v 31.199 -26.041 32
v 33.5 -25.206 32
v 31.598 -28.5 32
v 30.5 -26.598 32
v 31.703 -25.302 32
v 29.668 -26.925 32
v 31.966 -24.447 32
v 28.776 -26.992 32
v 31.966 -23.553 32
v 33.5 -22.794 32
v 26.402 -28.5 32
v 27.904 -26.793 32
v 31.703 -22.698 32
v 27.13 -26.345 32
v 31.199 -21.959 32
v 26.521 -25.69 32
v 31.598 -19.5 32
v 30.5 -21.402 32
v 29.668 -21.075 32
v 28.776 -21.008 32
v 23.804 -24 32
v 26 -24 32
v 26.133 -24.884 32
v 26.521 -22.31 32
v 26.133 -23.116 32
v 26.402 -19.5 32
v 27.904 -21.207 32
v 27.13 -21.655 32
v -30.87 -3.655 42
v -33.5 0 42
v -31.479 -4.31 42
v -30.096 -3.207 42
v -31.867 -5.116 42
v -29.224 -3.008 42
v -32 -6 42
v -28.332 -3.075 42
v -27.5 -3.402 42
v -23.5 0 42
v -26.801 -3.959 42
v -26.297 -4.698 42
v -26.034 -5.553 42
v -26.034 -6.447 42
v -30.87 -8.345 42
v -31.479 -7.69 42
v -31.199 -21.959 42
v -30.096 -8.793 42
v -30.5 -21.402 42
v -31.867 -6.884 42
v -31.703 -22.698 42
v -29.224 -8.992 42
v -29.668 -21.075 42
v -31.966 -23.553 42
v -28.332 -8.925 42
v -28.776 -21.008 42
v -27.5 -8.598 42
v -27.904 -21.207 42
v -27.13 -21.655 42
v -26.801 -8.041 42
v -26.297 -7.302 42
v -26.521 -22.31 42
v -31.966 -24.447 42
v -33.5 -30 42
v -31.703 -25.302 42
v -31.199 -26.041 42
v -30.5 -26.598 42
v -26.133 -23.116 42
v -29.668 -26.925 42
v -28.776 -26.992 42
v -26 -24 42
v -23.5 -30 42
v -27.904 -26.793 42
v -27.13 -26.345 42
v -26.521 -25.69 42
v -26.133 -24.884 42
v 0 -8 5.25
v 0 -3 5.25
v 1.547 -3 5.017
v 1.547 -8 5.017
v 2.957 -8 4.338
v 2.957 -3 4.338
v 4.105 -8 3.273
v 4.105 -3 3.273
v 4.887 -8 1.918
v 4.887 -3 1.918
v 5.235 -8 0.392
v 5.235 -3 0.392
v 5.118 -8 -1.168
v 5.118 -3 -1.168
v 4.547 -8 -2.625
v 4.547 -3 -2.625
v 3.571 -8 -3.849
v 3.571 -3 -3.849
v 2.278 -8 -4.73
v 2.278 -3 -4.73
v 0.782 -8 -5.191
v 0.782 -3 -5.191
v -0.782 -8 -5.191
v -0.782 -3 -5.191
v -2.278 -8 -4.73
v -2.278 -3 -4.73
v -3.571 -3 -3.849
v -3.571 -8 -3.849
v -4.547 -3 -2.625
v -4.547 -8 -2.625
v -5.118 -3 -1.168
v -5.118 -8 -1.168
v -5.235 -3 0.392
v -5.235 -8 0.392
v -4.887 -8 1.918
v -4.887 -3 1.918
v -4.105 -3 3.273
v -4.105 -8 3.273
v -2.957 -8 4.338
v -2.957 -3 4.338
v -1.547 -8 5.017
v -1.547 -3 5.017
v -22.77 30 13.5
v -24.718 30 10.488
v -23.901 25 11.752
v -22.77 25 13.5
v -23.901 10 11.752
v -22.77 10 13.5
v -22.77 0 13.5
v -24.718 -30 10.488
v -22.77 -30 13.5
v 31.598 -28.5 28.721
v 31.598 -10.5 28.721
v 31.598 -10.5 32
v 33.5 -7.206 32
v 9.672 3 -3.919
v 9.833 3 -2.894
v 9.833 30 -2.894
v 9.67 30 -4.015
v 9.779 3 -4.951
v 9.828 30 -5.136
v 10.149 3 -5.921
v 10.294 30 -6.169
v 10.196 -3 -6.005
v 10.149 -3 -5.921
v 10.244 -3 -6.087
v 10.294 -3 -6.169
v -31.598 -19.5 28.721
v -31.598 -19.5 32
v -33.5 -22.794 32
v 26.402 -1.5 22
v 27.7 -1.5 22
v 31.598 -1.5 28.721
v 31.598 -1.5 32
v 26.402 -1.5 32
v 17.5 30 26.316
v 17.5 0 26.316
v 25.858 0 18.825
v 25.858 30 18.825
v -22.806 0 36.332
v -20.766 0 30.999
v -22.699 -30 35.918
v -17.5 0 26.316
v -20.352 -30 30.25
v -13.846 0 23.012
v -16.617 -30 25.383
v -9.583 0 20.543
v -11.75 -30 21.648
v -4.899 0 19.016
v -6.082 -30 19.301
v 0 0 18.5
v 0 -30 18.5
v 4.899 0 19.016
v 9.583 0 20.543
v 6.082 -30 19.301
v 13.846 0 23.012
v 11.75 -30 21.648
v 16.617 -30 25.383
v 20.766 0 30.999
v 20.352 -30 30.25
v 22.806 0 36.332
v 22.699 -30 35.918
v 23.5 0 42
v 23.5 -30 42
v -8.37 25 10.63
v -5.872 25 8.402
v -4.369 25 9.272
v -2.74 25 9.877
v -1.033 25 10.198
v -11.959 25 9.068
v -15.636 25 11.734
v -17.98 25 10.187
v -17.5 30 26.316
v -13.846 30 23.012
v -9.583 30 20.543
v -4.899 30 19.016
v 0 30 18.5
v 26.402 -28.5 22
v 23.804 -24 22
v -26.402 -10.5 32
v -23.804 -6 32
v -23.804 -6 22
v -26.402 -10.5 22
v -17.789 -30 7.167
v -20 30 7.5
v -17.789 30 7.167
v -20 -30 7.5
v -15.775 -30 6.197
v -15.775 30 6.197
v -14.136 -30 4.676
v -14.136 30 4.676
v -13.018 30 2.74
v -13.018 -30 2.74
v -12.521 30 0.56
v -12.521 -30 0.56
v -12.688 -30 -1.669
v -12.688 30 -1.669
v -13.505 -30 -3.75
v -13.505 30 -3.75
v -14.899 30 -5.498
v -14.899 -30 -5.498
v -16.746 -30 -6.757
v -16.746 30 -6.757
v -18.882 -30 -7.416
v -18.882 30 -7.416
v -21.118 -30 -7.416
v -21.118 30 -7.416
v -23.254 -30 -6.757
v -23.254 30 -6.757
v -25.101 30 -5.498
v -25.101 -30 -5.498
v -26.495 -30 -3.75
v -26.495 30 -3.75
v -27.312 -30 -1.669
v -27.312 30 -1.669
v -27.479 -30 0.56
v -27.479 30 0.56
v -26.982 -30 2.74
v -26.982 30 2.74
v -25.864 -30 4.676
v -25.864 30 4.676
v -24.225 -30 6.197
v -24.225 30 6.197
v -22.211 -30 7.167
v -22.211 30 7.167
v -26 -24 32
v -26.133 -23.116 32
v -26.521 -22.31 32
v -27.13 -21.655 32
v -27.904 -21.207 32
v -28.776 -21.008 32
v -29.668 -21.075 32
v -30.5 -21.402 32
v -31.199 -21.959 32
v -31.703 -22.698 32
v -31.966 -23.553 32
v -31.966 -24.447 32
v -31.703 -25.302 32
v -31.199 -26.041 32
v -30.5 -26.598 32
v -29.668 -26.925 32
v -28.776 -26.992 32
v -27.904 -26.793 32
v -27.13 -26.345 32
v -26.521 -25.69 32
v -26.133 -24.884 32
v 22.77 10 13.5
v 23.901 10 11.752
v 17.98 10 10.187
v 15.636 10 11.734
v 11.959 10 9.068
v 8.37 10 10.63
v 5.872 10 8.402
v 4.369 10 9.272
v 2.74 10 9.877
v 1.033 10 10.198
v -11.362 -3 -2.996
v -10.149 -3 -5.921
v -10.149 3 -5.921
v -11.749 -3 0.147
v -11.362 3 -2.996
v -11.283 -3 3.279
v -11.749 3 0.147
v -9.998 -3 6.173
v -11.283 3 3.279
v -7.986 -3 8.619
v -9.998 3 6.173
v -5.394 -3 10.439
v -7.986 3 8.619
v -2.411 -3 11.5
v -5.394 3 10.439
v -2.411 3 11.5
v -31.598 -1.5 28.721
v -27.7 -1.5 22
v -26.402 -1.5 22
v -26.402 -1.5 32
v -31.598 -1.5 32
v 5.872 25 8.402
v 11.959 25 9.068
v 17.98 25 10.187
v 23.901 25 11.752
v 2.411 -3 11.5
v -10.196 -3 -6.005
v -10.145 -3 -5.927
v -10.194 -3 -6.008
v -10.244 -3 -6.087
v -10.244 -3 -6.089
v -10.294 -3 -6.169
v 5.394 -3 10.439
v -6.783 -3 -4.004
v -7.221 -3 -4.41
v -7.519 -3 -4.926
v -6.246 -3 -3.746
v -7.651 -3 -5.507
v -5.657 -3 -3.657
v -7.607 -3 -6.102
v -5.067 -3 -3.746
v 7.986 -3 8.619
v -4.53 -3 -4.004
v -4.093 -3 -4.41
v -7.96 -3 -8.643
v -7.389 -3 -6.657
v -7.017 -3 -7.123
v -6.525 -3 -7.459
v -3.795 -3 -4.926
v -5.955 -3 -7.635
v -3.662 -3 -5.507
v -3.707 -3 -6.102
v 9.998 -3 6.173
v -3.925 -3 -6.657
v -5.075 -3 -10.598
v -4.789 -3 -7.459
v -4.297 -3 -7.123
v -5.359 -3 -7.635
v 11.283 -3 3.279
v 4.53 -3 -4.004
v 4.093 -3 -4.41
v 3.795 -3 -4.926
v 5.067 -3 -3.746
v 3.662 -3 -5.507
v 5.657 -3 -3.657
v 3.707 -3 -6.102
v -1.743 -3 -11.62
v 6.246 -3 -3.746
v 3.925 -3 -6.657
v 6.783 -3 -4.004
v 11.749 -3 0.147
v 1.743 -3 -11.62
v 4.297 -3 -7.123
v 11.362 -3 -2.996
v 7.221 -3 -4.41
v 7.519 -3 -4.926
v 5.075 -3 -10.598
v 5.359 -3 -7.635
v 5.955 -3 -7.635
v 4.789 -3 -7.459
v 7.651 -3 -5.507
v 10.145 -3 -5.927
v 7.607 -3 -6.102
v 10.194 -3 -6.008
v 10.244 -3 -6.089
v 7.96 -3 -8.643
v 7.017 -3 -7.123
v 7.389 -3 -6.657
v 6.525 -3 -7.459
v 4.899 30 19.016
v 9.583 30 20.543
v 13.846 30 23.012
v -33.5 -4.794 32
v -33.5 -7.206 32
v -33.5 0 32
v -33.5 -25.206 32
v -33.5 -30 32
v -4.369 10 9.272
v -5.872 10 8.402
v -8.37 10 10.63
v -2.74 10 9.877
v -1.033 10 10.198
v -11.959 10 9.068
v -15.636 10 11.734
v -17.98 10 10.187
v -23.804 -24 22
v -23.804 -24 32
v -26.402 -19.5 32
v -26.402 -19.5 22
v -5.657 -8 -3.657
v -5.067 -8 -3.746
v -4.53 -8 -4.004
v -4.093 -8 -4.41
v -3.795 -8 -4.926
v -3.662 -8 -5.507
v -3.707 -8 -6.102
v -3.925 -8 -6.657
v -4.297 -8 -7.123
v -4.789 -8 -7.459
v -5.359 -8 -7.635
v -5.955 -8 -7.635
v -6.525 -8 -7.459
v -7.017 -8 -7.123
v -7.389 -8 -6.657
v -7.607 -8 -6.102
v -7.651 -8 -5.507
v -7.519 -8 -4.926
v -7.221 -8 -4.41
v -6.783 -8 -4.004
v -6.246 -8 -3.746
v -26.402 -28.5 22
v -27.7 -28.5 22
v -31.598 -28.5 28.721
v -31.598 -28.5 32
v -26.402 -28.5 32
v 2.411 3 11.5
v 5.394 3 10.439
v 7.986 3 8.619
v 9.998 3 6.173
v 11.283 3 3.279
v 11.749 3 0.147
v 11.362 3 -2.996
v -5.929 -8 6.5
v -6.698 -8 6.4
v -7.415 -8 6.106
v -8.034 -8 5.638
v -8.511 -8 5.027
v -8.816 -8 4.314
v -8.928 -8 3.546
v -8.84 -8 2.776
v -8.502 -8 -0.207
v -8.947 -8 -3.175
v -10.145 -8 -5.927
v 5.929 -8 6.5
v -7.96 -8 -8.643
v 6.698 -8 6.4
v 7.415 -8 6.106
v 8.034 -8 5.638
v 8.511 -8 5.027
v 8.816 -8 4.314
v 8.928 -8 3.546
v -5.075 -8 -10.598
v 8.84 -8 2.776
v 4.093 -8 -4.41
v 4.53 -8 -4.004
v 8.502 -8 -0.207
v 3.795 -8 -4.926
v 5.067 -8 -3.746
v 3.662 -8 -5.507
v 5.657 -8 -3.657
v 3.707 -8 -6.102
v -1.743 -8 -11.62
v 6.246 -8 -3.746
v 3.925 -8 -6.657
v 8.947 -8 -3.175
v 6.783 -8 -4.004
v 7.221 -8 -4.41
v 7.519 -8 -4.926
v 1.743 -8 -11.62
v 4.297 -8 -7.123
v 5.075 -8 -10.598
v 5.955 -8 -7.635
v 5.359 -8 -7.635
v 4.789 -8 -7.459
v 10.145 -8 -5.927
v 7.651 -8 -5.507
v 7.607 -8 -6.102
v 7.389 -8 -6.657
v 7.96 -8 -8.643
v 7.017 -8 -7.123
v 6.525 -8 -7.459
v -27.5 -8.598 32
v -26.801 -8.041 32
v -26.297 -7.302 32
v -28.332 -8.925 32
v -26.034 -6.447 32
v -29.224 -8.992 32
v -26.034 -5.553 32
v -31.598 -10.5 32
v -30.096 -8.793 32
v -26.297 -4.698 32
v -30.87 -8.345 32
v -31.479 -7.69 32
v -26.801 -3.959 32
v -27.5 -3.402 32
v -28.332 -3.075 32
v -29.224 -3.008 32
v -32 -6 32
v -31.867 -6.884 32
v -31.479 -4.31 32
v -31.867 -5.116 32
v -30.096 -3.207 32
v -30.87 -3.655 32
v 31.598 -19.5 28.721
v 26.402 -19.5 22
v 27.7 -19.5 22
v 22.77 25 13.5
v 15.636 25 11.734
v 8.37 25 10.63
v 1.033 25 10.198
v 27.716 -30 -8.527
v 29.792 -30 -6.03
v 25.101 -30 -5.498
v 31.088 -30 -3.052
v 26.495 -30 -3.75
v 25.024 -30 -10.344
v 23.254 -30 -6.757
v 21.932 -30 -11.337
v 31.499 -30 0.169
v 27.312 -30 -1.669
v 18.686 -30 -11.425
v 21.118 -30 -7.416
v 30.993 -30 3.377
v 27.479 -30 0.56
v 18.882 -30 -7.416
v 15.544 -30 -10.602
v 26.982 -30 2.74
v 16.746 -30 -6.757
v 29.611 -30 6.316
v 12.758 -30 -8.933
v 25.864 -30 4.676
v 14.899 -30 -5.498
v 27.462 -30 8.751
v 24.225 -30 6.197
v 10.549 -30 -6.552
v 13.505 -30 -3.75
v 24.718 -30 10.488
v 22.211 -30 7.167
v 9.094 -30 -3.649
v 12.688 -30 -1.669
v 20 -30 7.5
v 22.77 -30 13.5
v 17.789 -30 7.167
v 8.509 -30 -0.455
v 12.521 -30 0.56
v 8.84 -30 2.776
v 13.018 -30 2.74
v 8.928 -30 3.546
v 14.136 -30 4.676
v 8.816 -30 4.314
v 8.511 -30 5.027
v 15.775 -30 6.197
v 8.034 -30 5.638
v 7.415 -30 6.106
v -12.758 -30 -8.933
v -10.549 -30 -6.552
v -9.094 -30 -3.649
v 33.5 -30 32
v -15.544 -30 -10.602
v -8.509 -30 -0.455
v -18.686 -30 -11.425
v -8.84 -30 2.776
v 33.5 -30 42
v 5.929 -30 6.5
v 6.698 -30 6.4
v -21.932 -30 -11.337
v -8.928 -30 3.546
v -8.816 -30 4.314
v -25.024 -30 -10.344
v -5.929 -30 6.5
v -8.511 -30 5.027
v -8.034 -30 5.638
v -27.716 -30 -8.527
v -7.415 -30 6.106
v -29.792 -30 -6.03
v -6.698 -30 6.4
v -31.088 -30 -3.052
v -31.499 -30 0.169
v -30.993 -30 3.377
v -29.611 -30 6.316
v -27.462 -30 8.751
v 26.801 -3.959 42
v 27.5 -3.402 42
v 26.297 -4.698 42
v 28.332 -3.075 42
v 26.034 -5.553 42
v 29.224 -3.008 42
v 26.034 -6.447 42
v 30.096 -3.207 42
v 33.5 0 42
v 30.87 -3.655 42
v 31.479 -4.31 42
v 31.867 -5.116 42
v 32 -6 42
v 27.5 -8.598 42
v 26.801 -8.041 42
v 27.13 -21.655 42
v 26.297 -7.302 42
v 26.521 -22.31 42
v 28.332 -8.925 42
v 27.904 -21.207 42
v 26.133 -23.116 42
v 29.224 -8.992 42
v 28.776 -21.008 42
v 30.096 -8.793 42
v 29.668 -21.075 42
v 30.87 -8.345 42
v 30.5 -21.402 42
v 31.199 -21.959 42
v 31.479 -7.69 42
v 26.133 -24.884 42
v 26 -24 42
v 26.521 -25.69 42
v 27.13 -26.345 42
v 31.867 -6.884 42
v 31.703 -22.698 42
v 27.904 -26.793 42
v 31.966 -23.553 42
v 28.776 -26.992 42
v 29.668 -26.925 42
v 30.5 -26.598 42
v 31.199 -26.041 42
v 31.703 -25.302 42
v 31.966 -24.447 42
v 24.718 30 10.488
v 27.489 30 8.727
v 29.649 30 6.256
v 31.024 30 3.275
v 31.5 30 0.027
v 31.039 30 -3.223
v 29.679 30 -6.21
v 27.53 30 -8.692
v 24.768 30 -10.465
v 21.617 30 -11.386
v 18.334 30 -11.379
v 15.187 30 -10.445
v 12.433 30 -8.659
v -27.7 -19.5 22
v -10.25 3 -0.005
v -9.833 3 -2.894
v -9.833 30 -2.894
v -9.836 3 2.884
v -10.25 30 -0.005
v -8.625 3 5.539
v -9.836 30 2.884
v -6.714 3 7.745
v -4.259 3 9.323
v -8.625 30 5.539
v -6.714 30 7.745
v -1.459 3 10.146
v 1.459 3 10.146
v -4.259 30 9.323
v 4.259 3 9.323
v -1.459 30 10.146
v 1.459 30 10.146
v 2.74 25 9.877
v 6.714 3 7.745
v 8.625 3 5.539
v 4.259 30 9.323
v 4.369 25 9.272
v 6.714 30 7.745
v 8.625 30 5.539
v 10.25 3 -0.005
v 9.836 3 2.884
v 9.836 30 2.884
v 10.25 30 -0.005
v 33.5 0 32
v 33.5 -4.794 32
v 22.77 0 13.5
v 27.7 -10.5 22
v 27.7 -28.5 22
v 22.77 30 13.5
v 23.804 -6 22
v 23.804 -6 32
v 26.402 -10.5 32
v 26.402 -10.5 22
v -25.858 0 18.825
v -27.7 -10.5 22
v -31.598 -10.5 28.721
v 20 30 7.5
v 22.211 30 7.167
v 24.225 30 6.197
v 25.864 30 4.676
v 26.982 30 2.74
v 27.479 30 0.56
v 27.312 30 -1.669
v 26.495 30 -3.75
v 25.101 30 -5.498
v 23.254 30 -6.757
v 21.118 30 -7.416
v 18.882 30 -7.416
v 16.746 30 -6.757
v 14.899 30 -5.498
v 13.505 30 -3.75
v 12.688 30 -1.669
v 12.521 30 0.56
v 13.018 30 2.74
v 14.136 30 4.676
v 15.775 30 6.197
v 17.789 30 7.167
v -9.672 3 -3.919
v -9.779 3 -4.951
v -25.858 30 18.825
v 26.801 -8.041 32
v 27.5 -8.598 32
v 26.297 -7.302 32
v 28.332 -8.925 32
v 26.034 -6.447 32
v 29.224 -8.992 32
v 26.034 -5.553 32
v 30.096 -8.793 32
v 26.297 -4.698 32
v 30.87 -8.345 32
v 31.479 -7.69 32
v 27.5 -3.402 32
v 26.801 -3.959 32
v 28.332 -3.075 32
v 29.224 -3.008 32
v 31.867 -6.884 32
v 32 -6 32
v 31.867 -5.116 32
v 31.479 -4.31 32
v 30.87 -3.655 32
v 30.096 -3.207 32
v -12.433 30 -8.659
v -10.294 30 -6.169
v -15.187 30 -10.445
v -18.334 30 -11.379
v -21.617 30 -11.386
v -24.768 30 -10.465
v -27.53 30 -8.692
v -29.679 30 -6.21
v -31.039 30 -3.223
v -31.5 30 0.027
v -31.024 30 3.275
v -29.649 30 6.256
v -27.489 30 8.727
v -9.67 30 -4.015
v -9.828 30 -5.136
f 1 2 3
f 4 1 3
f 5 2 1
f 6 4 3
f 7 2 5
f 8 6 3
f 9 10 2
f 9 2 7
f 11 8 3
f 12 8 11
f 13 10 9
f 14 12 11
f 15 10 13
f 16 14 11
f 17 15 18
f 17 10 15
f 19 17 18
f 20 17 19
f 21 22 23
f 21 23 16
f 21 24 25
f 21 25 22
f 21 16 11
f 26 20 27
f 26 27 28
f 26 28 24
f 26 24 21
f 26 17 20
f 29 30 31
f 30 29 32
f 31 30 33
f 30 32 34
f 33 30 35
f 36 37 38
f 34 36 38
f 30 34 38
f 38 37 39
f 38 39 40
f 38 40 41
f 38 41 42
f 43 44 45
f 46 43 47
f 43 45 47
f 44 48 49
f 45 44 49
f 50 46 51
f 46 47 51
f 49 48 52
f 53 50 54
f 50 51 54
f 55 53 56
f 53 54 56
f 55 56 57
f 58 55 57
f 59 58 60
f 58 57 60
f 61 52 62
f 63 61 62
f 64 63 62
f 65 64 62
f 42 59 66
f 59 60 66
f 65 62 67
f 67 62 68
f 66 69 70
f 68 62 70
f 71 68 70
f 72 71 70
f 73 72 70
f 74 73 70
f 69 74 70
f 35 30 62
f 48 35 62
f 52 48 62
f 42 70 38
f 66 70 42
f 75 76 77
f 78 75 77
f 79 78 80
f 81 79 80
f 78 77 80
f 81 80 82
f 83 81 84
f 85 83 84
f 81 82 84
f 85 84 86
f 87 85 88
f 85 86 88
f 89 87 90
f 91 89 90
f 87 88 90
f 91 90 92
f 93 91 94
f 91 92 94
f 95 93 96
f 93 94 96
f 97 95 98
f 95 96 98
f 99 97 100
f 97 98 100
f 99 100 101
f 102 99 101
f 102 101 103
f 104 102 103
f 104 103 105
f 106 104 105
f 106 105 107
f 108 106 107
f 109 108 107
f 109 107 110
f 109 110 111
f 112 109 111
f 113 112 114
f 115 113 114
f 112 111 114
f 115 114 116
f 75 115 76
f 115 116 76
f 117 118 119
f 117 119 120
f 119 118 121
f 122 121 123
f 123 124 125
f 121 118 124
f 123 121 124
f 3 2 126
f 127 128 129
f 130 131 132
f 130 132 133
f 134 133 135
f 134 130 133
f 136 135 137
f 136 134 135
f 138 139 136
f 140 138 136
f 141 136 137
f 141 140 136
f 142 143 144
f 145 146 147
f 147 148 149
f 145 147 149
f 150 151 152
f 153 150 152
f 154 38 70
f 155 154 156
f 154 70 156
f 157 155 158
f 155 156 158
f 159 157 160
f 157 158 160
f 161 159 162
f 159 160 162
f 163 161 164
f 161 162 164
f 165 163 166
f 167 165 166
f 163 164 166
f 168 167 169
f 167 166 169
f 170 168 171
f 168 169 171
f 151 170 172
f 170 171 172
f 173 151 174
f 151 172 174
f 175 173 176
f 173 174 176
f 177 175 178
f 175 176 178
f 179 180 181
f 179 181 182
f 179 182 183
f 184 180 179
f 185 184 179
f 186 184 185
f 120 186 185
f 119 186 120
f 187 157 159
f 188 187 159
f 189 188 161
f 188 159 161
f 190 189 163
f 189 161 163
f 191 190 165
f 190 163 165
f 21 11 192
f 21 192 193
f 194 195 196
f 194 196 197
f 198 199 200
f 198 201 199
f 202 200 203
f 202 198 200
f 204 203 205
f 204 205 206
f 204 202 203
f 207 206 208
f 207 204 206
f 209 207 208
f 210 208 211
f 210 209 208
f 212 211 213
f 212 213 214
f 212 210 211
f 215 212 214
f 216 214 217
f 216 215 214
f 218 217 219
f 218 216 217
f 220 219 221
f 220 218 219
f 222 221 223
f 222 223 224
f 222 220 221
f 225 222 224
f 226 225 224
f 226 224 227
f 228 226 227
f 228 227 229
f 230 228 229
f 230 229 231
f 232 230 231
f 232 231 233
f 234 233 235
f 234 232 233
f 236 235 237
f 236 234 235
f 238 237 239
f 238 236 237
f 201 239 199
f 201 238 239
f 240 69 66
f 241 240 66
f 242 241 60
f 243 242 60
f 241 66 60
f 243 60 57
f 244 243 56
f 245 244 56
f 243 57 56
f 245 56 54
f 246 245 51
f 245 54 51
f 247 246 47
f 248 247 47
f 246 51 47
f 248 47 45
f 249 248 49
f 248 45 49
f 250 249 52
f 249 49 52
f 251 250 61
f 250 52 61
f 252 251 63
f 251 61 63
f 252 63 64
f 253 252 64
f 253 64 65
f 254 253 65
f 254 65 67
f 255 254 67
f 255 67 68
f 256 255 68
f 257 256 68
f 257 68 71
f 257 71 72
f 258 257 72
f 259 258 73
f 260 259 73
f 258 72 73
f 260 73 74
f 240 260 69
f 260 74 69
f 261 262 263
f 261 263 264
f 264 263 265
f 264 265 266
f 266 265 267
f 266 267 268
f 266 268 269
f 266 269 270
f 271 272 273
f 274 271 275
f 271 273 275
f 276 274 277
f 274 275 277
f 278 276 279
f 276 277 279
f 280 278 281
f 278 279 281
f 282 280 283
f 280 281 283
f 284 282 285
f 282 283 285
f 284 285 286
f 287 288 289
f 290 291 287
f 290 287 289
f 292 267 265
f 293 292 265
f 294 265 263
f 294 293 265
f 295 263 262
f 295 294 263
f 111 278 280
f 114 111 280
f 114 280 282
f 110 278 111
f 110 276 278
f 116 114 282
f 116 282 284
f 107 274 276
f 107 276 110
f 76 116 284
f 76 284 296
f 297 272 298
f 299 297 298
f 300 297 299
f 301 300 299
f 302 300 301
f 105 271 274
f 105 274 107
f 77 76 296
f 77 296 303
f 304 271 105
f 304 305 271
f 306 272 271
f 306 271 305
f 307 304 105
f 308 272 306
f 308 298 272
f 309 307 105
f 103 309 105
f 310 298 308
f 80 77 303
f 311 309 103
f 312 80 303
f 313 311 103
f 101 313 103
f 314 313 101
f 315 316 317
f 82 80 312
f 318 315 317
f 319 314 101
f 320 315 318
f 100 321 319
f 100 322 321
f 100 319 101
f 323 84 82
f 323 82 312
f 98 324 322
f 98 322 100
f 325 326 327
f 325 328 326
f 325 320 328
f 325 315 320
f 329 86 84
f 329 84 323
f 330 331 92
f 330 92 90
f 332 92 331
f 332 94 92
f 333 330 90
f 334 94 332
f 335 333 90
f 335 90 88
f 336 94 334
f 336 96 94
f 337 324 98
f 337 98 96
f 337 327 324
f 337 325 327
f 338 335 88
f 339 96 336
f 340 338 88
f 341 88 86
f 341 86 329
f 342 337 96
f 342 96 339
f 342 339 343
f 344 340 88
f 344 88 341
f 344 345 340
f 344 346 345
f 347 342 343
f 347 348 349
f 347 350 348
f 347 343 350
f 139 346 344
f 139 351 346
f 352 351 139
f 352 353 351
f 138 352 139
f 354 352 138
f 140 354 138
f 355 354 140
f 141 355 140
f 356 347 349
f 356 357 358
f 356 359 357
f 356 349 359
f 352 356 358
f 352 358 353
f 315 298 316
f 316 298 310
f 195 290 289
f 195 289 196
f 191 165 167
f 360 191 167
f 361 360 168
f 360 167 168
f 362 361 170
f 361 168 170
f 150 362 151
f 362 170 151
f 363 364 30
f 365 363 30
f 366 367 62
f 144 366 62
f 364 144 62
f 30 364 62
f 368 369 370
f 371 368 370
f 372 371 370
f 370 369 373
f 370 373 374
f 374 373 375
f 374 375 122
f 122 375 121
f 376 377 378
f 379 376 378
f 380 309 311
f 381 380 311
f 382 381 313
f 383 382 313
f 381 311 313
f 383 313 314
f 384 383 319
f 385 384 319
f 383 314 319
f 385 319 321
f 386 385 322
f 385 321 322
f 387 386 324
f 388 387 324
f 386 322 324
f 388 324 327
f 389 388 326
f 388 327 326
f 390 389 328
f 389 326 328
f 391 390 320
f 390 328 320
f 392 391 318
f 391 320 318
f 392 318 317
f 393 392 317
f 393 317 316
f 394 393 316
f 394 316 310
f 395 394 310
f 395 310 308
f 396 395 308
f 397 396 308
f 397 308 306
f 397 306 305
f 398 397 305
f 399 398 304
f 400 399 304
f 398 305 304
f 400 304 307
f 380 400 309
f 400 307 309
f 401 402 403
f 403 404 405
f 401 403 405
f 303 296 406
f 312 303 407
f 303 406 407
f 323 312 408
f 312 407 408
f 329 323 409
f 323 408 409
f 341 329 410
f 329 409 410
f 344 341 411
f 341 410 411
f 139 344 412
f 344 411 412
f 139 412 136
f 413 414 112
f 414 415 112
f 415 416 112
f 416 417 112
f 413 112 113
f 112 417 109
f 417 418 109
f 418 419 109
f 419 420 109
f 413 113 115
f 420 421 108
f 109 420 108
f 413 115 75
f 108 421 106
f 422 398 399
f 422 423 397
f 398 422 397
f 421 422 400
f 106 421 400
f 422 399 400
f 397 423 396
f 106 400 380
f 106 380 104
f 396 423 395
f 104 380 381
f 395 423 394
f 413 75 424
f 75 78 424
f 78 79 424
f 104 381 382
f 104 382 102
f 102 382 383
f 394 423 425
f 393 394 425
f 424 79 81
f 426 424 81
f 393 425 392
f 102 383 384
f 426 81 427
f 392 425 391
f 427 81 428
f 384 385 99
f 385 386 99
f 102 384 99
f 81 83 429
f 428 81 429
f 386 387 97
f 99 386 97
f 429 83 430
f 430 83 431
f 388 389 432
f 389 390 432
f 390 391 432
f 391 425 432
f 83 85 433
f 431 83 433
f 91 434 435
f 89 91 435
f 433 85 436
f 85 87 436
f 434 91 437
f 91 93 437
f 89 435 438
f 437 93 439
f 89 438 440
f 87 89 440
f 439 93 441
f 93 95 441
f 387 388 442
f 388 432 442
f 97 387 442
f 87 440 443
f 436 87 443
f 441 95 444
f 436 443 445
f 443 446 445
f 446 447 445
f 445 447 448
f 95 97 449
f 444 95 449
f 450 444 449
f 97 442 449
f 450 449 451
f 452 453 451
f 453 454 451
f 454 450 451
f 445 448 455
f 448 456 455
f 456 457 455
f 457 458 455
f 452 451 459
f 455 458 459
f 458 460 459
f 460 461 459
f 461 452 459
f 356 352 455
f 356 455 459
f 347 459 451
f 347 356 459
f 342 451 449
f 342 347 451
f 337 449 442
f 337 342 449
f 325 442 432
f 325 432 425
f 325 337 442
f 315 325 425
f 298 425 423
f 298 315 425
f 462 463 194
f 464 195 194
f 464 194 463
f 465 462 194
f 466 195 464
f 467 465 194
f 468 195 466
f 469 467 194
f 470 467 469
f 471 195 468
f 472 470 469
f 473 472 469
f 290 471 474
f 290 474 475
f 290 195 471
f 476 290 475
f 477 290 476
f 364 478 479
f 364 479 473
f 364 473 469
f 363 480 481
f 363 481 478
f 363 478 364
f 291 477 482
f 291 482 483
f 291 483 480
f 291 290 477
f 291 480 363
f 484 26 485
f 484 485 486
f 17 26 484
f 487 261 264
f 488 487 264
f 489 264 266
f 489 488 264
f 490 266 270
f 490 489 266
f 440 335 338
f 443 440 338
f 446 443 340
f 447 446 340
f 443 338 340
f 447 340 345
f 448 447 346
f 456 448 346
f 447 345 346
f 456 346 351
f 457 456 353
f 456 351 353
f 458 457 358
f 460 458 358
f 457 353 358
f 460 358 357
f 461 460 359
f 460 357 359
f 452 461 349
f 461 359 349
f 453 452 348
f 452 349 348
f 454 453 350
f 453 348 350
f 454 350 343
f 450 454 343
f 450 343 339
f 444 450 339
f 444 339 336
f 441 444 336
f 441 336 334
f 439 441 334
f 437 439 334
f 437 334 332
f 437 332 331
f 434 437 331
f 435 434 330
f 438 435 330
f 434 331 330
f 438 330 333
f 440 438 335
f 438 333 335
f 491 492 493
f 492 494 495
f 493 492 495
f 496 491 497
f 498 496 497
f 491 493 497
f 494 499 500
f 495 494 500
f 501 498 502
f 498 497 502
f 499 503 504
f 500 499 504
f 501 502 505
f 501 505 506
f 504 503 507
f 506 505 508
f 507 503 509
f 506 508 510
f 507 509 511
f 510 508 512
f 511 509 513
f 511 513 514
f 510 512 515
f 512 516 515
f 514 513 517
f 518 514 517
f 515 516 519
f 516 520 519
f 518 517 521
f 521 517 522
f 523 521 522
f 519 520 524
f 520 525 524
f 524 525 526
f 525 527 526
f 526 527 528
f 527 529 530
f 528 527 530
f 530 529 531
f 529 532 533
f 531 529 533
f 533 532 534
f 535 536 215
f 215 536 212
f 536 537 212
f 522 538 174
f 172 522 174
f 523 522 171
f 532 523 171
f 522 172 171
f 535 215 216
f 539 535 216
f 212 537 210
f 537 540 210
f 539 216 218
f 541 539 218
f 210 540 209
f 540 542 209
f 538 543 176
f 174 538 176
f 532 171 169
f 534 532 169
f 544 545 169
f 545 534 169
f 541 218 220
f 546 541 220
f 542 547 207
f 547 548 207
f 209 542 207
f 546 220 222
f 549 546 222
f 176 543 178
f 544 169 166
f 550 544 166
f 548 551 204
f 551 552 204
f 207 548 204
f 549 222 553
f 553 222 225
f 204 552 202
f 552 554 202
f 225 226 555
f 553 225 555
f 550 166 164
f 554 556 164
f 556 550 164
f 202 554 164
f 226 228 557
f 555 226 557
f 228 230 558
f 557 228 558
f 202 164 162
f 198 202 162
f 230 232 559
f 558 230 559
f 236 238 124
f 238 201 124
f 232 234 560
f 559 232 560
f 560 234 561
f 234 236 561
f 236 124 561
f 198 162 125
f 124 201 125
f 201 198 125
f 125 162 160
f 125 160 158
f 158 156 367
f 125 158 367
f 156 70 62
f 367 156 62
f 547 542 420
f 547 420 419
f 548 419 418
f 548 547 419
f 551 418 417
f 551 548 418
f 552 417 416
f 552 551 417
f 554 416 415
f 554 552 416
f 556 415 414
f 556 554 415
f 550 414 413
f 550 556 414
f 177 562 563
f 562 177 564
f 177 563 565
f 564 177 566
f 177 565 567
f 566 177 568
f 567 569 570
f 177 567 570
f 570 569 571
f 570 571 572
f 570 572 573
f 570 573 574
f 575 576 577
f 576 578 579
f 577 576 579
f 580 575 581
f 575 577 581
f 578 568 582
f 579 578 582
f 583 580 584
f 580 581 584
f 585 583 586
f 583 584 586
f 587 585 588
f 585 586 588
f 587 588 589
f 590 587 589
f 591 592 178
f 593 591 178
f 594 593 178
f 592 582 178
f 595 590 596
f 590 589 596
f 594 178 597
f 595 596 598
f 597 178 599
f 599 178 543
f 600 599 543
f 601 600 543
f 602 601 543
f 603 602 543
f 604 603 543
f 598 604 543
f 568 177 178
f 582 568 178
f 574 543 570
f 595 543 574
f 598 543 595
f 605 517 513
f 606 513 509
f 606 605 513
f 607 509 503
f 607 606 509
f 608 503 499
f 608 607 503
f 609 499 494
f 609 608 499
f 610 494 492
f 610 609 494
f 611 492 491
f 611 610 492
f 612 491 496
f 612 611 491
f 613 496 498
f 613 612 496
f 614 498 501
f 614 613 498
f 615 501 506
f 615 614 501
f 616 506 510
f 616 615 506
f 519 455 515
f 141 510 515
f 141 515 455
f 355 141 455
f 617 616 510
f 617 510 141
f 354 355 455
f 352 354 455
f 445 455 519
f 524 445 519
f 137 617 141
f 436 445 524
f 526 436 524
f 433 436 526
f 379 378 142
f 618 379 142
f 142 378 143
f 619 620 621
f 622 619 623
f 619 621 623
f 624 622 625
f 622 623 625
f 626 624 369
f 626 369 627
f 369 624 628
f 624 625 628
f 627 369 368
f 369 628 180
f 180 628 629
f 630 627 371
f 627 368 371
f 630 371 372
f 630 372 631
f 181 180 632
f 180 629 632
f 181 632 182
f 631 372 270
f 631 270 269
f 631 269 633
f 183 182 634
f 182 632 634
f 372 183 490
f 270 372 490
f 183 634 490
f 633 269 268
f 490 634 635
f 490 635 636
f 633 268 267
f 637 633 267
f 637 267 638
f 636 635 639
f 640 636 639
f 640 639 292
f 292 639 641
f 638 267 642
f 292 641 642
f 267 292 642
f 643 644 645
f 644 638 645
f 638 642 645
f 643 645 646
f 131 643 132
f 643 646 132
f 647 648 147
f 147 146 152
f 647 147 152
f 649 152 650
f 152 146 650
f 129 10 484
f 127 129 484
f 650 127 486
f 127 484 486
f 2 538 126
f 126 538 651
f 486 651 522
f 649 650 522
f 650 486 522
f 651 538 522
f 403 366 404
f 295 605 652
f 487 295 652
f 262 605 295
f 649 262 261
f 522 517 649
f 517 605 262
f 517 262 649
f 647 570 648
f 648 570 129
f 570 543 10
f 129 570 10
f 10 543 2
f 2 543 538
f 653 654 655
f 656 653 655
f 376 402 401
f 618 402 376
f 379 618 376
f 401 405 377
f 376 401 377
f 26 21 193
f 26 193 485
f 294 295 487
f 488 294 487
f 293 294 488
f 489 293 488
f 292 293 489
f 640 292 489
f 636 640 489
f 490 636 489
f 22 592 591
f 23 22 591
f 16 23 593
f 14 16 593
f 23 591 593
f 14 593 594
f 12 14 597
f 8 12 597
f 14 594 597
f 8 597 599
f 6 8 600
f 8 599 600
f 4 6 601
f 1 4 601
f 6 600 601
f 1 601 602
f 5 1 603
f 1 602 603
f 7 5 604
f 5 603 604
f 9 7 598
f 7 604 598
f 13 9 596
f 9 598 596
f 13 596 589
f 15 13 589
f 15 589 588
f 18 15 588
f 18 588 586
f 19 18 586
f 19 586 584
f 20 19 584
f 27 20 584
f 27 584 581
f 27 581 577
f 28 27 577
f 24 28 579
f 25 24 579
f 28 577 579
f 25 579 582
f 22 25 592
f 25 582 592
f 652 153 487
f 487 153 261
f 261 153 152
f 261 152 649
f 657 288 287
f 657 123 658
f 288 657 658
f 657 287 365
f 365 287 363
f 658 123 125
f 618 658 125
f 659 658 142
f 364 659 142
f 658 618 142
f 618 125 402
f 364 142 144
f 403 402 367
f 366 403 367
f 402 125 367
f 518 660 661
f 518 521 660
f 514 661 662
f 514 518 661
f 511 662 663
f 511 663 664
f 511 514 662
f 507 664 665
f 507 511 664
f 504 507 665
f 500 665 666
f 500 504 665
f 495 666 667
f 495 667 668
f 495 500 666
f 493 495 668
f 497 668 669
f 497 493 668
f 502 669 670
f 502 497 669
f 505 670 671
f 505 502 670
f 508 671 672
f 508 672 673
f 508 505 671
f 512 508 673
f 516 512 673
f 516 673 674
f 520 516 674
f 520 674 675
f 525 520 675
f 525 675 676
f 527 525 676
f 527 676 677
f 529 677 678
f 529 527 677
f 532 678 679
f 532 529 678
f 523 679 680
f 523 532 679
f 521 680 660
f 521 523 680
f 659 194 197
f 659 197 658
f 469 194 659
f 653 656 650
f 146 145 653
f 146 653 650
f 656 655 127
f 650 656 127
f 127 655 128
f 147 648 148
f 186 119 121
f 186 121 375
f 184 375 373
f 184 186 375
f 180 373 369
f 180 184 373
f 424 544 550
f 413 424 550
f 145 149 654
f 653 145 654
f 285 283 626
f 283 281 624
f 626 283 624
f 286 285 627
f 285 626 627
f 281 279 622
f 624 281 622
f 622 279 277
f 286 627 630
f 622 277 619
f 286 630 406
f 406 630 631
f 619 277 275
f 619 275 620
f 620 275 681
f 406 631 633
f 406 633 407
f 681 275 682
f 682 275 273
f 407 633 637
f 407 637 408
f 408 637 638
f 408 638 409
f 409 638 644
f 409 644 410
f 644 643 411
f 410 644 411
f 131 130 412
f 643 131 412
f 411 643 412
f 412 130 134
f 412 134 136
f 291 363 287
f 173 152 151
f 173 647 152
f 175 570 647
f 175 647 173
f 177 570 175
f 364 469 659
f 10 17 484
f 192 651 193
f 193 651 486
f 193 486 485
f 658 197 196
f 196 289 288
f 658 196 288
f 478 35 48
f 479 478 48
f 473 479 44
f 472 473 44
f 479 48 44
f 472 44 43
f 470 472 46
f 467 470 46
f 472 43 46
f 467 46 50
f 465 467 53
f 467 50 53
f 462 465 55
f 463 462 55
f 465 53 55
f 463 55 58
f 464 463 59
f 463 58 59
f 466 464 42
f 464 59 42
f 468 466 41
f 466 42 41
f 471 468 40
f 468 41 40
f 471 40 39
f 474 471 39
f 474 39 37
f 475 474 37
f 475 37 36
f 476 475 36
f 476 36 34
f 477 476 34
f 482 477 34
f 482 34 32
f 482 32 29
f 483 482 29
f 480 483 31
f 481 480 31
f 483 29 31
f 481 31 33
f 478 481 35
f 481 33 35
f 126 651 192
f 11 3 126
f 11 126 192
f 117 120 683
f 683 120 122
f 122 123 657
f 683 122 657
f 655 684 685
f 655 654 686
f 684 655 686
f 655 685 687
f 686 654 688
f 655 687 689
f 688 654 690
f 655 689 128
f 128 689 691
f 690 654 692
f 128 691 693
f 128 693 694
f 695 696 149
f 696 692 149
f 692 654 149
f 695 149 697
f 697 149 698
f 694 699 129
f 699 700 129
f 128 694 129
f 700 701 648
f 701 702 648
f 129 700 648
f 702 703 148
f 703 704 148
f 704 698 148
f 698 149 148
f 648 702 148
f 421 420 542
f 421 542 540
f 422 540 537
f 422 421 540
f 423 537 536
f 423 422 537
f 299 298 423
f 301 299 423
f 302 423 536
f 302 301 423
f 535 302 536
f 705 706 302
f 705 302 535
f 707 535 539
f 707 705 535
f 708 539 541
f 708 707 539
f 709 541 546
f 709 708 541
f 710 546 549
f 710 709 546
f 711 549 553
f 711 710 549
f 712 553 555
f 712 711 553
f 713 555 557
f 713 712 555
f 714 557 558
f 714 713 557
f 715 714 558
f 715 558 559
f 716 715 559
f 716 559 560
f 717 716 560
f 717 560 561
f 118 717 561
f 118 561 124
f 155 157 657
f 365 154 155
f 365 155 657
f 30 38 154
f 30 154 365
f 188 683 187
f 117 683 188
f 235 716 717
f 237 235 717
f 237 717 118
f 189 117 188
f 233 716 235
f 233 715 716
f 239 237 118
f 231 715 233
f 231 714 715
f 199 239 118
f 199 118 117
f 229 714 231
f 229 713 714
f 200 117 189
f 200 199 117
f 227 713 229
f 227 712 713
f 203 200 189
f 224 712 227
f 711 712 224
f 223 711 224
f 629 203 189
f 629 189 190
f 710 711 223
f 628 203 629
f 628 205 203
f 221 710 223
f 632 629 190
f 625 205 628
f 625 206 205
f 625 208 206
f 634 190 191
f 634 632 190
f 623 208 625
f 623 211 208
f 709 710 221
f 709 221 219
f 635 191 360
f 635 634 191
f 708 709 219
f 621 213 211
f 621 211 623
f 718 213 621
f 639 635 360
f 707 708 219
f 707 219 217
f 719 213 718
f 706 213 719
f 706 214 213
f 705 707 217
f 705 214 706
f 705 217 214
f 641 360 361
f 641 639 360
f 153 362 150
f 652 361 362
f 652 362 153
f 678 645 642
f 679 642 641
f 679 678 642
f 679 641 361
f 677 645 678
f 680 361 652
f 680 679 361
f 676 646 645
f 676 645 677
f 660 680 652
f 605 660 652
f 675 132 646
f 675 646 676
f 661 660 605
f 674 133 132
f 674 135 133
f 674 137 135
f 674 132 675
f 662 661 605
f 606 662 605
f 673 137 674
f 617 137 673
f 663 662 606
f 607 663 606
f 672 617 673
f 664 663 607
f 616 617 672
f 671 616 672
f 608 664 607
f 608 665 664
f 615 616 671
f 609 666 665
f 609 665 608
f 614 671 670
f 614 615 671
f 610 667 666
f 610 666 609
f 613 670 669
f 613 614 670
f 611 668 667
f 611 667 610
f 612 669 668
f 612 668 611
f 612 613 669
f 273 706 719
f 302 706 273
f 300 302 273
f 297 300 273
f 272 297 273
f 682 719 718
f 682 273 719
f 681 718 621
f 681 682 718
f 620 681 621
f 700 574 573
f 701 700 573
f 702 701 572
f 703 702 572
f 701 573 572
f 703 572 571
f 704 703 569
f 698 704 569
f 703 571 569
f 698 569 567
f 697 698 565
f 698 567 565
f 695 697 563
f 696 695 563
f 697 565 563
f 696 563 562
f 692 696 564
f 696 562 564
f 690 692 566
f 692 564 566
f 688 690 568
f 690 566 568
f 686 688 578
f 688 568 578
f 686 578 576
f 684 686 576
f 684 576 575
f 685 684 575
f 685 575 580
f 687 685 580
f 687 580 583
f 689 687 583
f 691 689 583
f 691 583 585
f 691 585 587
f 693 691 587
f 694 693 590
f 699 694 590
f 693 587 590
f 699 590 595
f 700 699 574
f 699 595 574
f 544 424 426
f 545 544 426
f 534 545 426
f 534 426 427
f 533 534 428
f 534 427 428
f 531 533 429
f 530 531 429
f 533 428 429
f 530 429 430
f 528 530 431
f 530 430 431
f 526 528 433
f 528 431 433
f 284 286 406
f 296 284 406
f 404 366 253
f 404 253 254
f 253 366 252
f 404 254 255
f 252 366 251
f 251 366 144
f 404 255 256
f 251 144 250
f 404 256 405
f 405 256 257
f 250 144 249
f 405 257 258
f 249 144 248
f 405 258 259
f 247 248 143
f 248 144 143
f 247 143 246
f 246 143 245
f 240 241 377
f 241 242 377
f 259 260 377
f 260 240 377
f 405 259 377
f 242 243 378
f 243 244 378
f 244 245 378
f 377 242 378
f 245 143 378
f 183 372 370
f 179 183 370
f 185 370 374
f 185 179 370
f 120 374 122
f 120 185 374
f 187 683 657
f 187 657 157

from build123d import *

# Parameters (mm, degrees)
SKETCH1_R           = 11.5
SKETCH1_R_2         = 7.5
BOSS_EXTRUDE1_DEPTH = 30
FILLET1_R           = 3
SKETCH2_R           = 11.75
CUT_EXTRUDE3_DEPTH  = 3
SKETCH3_R           = 11.75
SKETCH3_R_2         = 5.25
SKETCH3_R_3         = 2
BOSS_EXTRUDE2_DEPTH = 5
SKETCH4_W           = 40
SKETCH4_H           = 60
BOSS_EXTRUDE3_DEPTH = 2
SKETCH5_R           = 10.25
CUT_EXTRUDE4_DEPTH  = 27
FILLET2_START       = -3
FILLET2_DEPTH       = 34
BOSS_EXTRUDE4_DEPTH = 30
BOSS_EXTRUDE5_DEPTH = 30
CUT_EXTRUDE5_DEPTH  = 15
SKETCH9_R           = 3
CUT_EXTRUDE6_DEPTH  = 10
CUT_EXTRUDE7_DEPTH  = 10


with BuildPart() as part:
    # Sketch1 → Boss-Extrude1 (new, symmetric)
    # profile 1 of 3: a face of its own
    with BuildSketch(Plane(origin=(0, 0, 0), x_dir=(1, 0, 0), z_dir=(0, 1, 0))):
        with Locations((-20, 0)):
            Circle(SKETCH1_R)
        with Locations(Location((-20, 0, 0), (0, 0, 270))):
            Circle(SKETCH1_R_2, mode=Mode.SUBTRACT)
    # profile 2 of 3: a face of its own
    with BuildSketch(Plane(origin=(0, 0, 0), x_dir=(1, 0, 0), z_dir=(0, 1, 0))):
        with Locations((20, 0)):
            Circle(SKETCH1_R)
        with Locations(Location((20, 0, 0), (0, 0, 270))):
            Circle(SKETCH1_R_2, mode=Mode.SUBTRACT)
    # profile 3 of 3: a face of its own
    with BuildSketch(Plane(origin=(0, 0, 0), x_dir=(1, 0, 0), z_dir=(0, 1, 0))):
        with BuildLine():
            ThreePointArc((-10.513167019, -6.5), (-14.638097353, -10.173494975), (-20, -11.5))
            Line((-20, -11.5), (20, -11.5))
            ThreePointArc((20, -11.5), (14.638097353, -10.173494975), (10.513167019, -6.5))
            Line((10.513167019, -6.5), (-10.513167019, -6.5))
        make_face()
    extrude(amount=BOSS_EXTRUDE1_DEPTH, both=True)

    # Fillet1
    fillet1_edges = [part.edges().sort_by_distance(p)[0] for p in [
        (-10.513167019, 0, 6.5),
        (10.513167019, 0, 6.5),
    ]]
    fillet(fillet1_edges, radius=FILLET1_R)

    # Sketch2 → Cut-Extrude3 (cut, symmetric)
    with BuildSketch(Plane(origin=(0, 0, 0), x_dir=(1, 0, 0), z_dir=(0, 1, 0))):
        Circle(SKETCH2_R)
    extrude(amount=CUT_EXTRUDE3_DEPTH, both=True, mode=Mode.SUBTRACT)

    # Sketch3 → Boss-Extrude2 (add)
    with BuildSketch(Plane(origin=(0, -3, 0), x_dir=(1, 0, 0), z_dir=(0, 1, 0))):
        Circle(SKETCH3_R)
        with Locations(Location((0, 0, 0), (0, 0, 270))):
            Circle(SKETCH3_R_2, mode=Mode.SUBTRACT)
        with Locations(Location((5.656854249, 5.656854249, 0), (0, 0, 270))):
            Circle(SKETCH3_R_3, mode=Mode.SUBTRACT)
        with Locations(Location((-5.656854249, 5.656854249, 0), (0, 0, 270))):
            Circle(SKETCH3_R_3, mode=Mode.SUBTRACT)
    extrude(amount=-BOSS_EXTRUDE2_DEPTH)

    # Sketch4 → Boss-Extrude3 (add)
    with BuildSketch(Plane.XY.offset(11.5)):
        Rectangle(SKETCH4_W, SKETCH4_H)
    extrude(amount=BOSS_EXTRUDE3_DEPTH)

    # Chamfer1
    # the kernel refuses this chamfer: 8 mm, written as the material it adds along each edge
    with BuildSketch(Plane(origin=(20, -30, 11.5), x_dir=(0.9777449098895067, 0, -0.20979726210120203), z_dir=(0, 1, 0))) as chamfer1_piece_1_section:
        with BuildLine():
            Line((5.051611198, 0.22627417), (-1.544518324, -6.369855352))
            Line((-1.544518324, -6.369855352), (-1.70095751, -6.33628779))
            ThreePointArc((-1.70095751, -6.33628779), (-0.843748586, -3.169588005), (-0.156439186, 0.033567562))
            Line((-0.156439186, 0.033567562), (0.033567562, 0.156439186))
            ThreePointArc((0.033567562, 0.156439186), (2.527924683, -0.095347808), (5.018043636, 0.382713356))
            Line((5.018043636, 0.382713356), (5.051611198, 0.22627417))
        make_face()
    chamfer1_piece_1 = extrude(amount=60, mode=Mode.PRIVATE)
    chamfer1_piece_1 = split(chamfer1_piece_1, bisect_by=Plane(origin=(20, -30, 13.5), z_dir=(0, 0, -1)), keep=Keep.TOP, mode=Mode.PRIVATE)
    add(chamfer1_piece_1)
    with BuildSketch(Plane(origin=(-20, -30, 11.5), x_dir=(-0.9777449098895067, 0, -0.20979726210120223), z_dir=(0, 1, 0))) as chamfer1_piece_2_section:
        with BuildLine():
            Line((5.051611198, -0.22627417), (-1.544518324, 6.369855352))
            Line((-1.544518324, 6.369855352), (-1.70095751, 6.33628779))
            ThreePointArc((-1.70095751, 6.33628779), (-0.843748586, 3.169588005), (-0.156439186, -0.033567562))
            Line((-0.156439186, -0.033567562), (0.033567562, -0.156439186))
            ThreePointArc((0.033567562, -0.156439186), (2.527924683, 0.095347808), (5.018043636, -0.382713356))
            Line((5.018043636, -0.382713356), (5.051611198, -0.22627417))
        make_face()
    chamfer1_piece_2 = extrude(amount=60, mode=Mode.PRIVATE)
    chamfer1_piece_2 = split(chamfer1_piece_2, bisect_by=Plane(origin=(-20, -30, 13.5), z_dir=(0, 0, -1)), keep=Keep.TOP, mode=Mode.PRIVATE)
    add(chamfer1_piece_2)

    # Sketch5 → Cut-Extrude4 (cut)
    with BuildSketch(Plane(origin=(0, 30, 0), x_dir=(1, 0, 0), z_dir=(0, 1, 0))):
        Circle(SKETCH5_R)
    extrude(amount=-CUT_EXTRUDE4_DEPTH, mode=Mode.SUBTRACT)

    # Fillet2: read off the stored shape, not the designer's step
    # Fillet2 outline → Fillet2 (cut)
    with BuildSketch(Plane(origin=(0, 0, 0), x_dir=(1, 0, 0), z_dir=(0, 1, 0)).offset(FILLET2_START)):
        with BuildLine():
            ThreePointArc((-9.833031798, 2.893783968), (-9.601199579, 3.588797381), (-9.3203125, 4.265474757))
            ThreePointArc((-9.3203125, 4.265474757), (-9.763069468, 5.239776072), (-10.294479167, 6.168700459))
            ThreePointArc((-10.294479167, 6.168700459), (-9.709438477, 4.581166738), (-9.833031798, 2.893783968))
        make_face()
        with BuildLine():
            ThreePointArc((10.294479167, 6.168700459), (9.763069468, 5.239776072), (9.3203125, 4.265474757))
            ThreePointArc((9.3203125, 4.265474757), (9.601199579, 3.588797381), (9.833031798, 2.893783968))
            ThreePointArc((9.833031798, 2.893783968), (9.709438477, 4.581166738), (10.294479167, 6.168700459))
        make_face()
    extrude(amount=FILLET2_DEPTH, mode=Mode.SUBTRACT)

    # Sketch6 → Boss-Extrude4 (add)
    with BuildSketch(Plane.XZ.offset(30)):
        with BuildLine():
            ThreePointArc((-23.5, 42), (0, 18.5), (23.5, 42))
            Line((23.5, 42), (33.5, 42))
            Line((33.5, 42), (33.5, 32))
            Line((33.5, 32), (22.769957826, 13.5))
            Line((22.769957826, 13.5), (-22.769957826, 13.5))
            Line((-22.769957826, 13.5), (-33.5, 32))
            Line((-33.5, 32), (-33.5, 42))
            Line((-33.5, 42), (-23.5, 42))
        make_face()
    extrude(amount=-BOSS_EXTRUDE4_DEPTH)

    # Sketch7 → Boss-Extrude5 (add)
    with BuildSketch(Plane(origin=(0, 0, 0), x_dir=(1, 0, 0), z_dir=(0, 1, 0))):
        with BuildLine():
            Line((0, -13.5), (0, -18.5))
            ThreePointArc((0, -18.5), (9.582977152, -20.542680761), (17.5, -26.315612859))
            Line((17.5, -26.315612859), (25.858213649, -18.824558077))
            Line((25.858213649, -18.824558077), (22.769957826, -13.5))
            Line((22.769957826, -13.5), (0, -13.5))
        make_face()
        with BuildLine():
            Line((-22.769957826, -13.5), (-25.858213649, -18.824558077))
            Line((-25.858213649, -18.824558077), (-17.5, -26.315612859))
            ThreePointArc((-17.5, -26.315612859), (-9.582977152, -20.542680761), (0, -18.5))
            Line((0, -18.5), (0, -13.5))
            Line((0, -13.5), (-22.769957826, -13.5))
        make_face()
    extrude(amount=BOSS_EXTRUDE5_DEPTH)

    # Sketch8 → Cut-Extrude5 (cut)
    with BuildSketch(Plane(origin=(0, 25, 0), x_dir=(1, 0, 0), z_dir=(0, 1, 0))):
        with BuildLine():
            Line((30.953633553, -14.257784453), (29.292282812, -15.746771207))
            ThreePointArc((29.292282812, -15.746771207), (0, -10.191127392), (-29.292282812, -15.746771207))
            Line((-29.292282812, -15.746771207), (-30.953633553, -14.257784453))
            ThreePointArc((-30.953633553, -14.257784453), (0, -8.191127392), (30.953633553, -14.257784453))
        make_face()
    extrude(amount=-CUT_EXTRUDE5_DEPTH, mode=Mode.SUBTRACT)

    # Sketch9 → Cut-Extrude6 (cut)
    with BuildSketch(Plane.XY.offset(42)):
        with Locations((29, -6)):
            Circle(SKETCH9_R)
        with Locations(Location((-29, -6, 0), (0, 0, 180))):
            Circle(SKETCH9_R)
        with Locations((-29, -24)):
            Circle(SKETCH9_R)
        with Locations(Location((29, -24, 0), (0, 0, 180))):
            Circle(SKETCH9_R)
    extrude(amount=-CUT_EXTRUDE6_DEPTH, mode=Mode.SUBTRACT)

    # Sketch10 → Cut-Extrude7 (cut)
    with BuildSketch(Plane.XY.offset(32)):
        Polygon((34.196152423, -6), (31.598076211, -1.5), (26.401923789, -1.5), (23.803847577, -6), (26.401923789, -10.5), (31.598076211, -10.5), align=None)
        Polygon((31.598076211, -19.5), (34.196152423, -24), (31.598076211, -28.5), (26.401923789, -28.5), (23.803847577, -24), (26.401923789, -19.5), align=None)
        Polygon((-34.196152423, -24), (-31.598076211, -28.5), (-26.401923789, -28.5), (-23.803847577, -24), (-26.401923789, -19.5), (-31.598076211, -19.5), align=None)
        Polygon((-31.598076211, -10.5), (-34.196152423, -6), (-31.598076211, -1.5), (-26.401923789, -1.5), (-23.803847577, -6), (-26.401923789, -10.5), align=None)
    extrude(amount=-CUT_EXTRUDE7_DEPTH, mode=Mode.SUBTRACT)


solid = part.part
